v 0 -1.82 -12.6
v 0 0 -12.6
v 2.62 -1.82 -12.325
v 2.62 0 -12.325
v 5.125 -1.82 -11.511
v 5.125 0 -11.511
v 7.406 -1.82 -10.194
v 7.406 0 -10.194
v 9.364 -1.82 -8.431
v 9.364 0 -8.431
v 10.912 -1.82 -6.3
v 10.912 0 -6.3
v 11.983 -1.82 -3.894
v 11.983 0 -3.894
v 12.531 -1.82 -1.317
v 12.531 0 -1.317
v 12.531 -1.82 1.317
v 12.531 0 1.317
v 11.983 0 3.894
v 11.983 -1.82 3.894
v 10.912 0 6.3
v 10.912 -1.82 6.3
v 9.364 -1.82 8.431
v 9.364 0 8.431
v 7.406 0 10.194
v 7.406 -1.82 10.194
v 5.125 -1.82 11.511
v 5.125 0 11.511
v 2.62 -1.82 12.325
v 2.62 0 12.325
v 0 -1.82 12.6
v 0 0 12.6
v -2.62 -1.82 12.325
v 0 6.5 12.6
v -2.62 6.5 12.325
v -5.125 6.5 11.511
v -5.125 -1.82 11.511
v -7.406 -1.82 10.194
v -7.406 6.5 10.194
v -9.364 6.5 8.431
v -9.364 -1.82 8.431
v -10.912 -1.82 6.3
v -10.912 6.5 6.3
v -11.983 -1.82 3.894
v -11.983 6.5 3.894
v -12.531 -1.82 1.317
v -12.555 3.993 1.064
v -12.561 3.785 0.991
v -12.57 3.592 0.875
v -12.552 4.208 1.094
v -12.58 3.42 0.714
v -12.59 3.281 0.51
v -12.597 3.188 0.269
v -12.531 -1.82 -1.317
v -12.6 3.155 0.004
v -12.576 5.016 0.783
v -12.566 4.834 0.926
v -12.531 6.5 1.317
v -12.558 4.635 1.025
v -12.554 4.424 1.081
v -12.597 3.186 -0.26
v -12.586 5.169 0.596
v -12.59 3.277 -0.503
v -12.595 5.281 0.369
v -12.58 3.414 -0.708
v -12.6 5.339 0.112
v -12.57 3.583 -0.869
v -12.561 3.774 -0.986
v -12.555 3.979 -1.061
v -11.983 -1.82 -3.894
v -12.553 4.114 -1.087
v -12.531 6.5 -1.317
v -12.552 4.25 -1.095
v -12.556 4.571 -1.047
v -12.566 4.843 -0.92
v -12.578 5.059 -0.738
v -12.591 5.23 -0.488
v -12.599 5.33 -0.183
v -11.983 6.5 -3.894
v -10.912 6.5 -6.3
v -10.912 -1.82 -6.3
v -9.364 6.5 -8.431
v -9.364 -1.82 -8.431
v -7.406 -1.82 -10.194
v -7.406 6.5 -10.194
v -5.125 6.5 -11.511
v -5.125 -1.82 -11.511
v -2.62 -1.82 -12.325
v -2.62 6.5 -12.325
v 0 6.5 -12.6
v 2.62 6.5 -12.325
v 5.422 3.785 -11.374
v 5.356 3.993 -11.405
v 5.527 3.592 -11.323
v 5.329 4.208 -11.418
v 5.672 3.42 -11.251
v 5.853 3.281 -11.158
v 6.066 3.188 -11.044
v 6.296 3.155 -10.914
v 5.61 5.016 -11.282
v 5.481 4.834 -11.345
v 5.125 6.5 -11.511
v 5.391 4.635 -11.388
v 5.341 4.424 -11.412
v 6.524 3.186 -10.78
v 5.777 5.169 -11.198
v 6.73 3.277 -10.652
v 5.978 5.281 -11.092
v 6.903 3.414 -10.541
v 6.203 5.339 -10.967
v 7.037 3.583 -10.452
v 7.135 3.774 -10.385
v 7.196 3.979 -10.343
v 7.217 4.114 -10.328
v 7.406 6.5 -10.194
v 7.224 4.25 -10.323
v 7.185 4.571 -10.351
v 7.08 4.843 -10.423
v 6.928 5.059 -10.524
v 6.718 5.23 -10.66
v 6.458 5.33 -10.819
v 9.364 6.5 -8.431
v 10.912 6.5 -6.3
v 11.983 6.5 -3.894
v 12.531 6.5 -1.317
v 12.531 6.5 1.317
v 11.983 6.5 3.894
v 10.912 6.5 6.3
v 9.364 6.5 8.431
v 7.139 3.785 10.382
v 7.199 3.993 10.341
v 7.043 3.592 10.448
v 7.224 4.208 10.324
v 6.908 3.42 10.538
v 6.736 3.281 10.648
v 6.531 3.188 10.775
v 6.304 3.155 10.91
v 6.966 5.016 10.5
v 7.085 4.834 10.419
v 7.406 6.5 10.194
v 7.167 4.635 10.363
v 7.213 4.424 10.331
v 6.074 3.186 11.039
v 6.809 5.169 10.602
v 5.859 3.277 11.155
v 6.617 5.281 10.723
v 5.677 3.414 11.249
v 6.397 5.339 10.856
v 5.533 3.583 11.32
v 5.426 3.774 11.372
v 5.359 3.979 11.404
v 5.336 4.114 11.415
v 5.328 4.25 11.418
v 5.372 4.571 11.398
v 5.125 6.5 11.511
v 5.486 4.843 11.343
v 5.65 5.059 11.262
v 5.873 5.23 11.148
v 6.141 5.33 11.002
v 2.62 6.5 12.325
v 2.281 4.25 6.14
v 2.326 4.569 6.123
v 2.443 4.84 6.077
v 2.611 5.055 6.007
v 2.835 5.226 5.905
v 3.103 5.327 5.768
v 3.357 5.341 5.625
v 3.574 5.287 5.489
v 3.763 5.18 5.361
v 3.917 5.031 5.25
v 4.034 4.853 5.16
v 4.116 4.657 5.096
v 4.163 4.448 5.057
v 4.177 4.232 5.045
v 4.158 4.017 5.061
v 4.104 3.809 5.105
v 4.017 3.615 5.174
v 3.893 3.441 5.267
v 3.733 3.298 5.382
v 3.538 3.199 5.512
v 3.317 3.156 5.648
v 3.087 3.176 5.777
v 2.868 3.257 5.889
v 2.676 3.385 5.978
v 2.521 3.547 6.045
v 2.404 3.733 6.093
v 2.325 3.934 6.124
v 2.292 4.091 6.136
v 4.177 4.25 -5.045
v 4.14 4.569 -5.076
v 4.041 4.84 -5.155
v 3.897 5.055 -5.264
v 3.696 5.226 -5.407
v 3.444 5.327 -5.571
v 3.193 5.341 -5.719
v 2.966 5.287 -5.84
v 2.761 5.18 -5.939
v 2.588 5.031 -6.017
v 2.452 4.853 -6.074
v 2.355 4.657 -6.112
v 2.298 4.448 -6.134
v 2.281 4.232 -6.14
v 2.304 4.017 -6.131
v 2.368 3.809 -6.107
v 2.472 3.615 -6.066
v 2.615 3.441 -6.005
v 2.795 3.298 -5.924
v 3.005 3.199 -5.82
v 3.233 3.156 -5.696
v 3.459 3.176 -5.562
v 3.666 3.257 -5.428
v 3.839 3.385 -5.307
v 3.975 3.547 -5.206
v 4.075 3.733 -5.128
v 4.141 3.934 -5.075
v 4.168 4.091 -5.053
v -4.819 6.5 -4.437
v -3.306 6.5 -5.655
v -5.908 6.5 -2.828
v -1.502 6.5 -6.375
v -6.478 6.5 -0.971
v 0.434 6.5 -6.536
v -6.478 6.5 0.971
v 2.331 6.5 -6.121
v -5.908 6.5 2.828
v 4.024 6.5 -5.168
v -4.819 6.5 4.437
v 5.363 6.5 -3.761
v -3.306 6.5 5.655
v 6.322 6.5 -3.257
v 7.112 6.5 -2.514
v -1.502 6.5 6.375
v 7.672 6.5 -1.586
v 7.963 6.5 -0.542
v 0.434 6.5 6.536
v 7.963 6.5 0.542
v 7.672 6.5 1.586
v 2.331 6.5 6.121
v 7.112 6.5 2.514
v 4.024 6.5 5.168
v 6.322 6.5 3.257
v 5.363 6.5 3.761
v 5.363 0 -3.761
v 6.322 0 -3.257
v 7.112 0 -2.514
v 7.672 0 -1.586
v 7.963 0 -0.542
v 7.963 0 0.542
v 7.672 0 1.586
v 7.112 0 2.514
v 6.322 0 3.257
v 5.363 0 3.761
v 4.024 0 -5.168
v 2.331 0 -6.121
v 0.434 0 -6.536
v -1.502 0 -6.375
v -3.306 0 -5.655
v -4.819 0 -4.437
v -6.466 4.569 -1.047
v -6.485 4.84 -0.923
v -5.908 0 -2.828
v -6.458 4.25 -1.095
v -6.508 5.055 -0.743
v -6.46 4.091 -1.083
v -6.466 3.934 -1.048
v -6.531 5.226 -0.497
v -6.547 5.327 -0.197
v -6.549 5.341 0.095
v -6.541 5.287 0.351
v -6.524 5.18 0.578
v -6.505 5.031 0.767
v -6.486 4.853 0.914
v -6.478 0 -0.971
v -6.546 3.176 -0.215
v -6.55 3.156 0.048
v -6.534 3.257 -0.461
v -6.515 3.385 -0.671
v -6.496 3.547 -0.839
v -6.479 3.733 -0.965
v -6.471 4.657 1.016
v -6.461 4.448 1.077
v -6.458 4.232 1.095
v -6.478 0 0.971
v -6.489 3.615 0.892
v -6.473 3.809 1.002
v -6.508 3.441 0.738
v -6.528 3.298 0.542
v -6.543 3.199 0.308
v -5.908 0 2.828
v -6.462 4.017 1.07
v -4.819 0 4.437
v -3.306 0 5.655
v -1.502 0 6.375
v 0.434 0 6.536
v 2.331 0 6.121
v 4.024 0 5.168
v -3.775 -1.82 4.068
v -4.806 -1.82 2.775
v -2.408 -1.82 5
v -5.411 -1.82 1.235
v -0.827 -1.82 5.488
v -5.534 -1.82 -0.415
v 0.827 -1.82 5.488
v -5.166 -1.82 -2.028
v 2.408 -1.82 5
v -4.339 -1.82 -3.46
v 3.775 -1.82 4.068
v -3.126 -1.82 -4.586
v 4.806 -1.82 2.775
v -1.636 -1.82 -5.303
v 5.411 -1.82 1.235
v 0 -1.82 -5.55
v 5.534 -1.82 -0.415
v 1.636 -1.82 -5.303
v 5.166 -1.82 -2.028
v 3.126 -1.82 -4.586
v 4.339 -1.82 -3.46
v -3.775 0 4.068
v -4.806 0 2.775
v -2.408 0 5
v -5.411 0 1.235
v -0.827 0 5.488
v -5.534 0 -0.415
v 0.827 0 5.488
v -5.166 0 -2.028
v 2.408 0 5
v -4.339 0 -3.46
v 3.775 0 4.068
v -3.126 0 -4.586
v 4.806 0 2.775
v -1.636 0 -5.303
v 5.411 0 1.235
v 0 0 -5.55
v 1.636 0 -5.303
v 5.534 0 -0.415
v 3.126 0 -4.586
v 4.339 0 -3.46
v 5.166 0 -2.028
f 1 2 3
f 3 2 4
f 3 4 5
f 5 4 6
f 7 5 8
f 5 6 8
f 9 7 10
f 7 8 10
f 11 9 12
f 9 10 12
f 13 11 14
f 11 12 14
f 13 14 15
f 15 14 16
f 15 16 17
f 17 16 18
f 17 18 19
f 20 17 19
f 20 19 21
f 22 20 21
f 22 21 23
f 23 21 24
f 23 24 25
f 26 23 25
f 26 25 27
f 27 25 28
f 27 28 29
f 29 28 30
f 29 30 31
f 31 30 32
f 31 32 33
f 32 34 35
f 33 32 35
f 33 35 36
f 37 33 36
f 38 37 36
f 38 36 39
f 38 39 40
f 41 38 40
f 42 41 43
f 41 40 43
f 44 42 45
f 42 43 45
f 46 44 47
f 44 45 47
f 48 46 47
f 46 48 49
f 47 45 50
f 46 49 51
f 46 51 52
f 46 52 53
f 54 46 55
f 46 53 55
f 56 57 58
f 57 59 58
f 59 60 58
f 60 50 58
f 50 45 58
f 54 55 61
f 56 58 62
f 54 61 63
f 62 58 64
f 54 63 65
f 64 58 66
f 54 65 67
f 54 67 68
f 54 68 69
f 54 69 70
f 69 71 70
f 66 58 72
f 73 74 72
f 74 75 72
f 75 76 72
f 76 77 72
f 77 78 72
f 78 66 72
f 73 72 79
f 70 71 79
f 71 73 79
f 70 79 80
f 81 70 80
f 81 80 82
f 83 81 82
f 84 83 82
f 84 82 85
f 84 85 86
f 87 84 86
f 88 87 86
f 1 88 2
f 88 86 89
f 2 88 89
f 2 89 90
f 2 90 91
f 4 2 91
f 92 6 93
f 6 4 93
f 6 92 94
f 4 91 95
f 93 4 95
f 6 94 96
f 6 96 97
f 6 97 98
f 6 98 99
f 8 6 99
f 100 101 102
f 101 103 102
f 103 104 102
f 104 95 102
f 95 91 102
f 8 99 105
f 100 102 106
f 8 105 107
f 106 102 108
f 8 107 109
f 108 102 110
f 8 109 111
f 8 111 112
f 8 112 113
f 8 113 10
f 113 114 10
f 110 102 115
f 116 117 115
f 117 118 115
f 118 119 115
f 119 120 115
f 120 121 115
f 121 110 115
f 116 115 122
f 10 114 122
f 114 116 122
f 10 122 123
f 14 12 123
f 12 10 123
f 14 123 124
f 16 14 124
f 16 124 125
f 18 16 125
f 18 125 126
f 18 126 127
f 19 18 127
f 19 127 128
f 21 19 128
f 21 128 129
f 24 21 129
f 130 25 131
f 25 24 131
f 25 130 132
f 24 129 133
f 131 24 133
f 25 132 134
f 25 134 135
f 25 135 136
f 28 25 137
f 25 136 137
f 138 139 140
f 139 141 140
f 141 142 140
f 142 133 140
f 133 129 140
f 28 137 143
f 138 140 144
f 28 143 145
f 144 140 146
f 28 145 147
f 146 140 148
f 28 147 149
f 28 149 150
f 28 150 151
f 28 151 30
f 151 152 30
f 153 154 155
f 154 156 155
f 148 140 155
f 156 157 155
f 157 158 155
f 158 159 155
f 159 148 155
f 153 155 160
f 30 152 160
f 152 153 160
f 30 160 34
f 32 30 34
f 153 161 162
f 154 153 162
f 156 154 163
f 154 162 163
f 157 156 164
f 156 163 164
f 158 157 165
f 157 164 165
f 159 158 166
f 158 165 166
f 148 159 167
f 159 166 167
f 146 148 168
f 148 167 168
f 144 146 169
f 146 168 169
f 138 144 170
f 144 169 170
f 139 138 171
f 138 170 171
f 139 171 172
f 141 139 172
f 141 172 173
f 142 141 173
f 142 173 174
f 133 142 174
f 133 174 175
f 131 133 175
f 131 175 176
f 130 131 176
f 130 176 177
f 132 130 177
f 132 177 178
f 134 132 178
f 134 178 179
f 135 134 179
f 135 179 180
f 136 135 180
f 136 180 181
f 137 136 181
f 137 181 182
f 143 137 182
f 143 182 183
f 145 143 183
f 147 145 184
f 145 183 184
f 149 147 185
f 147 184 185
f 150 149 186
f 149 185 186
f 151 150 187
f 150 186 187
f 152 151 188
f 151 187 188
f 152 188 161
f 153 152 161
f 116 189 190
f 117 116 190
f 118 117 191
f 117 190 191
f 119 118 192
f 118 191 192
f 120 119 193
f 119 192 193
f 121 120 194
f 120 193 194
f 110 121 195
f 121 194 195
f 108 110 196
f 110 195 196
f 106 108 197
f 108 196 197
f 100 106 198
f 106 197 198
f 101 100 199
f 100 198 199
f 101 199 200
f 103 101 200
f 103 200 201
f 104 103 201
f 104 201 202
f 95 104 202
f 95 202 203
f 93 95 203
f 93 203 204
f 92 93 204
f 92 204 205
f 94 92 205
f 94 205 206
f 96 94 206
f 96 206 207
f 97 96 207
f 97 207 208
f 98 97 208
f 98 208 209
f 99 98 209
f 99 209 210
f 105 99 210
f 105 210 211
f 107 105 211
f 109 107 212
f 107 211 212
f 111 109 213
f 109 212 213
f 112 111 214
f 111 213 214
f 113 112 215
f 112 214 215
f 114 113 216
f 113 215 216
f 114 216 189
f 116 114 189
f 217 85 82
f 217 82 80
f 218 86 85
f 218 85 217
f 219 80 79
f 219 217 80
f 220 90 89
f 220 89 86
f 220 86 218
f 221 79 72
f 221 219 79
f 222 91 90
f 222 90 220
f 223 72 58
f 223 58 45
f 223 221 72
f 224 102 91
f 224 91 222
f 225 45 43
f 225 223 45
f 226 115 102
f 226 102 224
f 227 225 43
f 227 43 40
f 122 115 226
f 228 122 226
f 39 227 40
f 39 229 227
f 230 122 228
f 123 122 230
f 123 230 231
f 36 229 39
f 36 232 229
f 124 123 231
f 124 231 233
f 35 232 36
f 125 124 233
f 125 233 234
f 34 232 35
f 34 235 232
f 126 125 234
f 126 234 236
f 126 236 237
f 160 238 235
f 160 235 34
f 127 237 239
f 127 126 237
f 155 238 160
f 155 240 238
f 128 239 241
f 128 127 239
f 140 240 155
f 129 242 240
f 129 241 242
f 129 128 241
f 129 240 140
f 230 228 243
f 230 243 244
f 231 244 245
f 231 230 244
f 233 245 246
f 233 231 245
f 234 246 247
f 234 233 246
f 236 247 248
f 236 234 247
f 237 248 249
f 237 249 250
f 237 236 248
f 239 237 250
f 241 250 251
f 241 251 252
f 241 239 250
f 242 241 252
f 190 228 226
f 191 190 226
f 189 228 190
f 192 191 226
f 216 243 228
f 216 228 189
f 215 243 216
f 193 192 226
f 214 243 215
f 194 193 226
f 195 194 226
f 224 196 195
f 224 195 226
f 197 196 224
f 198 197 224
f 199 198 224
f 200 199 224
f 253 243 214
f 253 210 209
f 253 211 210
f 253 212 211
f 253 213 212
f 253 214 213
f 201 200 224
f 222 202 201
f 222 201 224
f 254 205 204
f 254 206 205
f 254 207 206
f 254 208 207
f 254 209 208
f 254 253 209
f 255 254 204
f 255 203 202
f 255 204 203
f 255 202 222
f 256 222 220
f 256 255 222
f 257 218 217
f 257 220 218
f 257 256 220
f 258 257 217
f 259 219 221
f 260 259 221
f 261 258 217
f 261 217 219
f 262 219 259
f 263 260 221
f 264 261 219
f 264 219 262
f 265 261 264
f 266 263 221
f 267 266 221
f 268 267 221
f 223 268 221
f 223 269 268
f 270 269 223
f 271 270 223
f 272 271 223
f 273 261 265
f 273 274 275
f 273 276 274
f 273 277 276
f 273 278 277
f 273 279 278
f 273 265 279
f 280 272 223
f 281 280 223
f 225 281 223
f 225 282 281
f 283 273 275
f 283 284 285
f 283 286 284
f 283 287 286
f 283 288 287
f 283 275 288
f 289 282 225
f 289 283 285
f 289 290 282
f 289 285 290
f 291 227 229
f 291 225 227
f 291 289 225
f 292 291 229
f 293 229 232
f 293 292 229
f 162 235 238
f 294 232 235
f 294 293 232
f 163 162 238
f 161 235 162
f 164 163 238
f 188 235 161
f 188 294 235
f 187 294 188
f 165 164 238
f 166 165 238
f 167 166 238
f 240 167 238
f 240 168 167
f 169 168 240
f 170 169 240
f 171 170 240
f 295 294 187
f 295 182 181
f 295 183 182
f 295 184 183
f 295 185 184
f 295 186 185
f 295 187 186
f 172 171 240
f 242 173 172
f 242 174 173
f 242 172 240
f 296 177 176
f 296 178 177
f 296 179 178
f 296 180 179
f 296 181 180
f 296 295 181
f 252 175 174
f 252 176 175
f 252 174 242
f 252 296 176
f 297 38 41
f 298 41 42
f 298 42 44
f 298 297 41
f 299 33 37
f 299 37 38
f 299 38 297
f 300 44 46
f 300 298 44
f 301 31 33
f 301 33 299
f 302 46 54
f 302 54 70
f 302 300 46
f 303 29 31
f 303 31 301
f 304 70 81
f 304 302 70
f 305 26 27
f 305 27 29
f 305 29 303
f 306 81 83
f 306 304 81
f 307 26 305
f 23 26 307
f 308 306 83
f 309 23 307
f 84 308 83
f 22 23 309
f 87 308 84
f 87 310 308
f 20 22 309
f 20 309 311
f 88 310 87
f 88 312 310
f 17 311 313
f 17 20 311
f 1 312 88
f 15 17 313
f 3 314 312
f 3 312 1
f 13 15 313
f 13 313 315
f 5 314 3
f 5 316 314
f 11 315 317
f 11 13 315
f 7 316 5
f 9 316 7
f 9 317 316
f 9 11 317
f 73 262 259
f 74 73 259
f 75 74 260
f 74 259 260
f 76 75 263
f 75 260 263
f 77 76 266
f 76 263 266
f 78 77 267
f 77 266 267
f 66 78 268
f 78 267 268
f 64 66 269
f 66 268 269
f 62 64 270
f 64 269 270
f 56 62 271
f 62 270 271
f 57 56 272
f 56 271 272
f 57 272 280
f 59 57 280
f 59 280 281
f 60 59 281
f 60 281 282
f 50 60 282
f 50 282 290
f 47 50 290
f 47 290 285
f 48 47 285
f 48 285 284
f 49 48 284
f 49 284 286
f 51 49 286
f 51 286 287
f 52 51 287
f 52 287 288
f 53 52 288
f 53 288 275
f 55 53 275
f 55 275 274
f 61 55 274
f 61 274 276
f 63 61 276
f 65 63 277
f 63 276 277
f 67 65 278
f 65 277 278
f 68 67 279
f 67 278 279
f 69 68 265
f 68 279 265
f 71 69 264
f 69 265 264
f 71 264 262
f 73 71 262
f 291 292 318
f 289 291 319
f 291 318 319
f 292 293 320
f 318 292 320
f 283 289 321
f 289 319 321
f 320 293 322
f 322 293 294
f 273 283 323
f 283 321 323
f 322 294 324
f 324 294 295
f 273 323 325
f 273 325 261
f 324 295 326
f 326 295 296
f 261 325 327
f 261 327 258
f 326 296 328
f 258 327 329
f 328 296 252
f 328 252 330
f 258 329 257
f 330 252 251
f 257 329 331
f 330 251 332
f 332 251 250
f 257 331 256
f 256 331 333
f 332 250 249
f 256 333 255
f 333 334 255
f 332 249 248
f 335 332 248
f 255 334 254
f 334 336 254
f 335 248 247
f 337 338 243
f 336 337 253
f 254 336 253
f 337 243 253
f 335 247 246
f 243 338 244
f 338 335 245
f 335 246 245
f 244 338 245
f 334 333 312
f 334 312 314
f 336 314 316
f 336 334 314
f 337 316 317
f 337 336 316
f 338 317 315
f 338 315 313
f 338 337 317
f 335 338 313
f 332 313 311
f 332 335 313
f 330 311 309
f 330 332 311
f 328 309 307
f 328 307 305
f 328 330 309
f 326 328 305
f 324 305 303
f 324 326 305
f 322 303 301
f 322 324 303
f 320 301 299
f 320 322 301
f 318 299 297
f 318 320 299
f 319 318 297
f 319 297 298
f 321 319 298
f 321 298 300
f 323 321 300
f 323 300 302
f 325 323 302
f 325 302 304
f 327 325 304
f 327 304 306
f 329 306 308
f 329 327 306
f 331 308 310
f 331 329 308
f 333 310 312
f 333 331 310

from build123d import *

# Parameters (mm, degrees)
SKETCH1_R           = 12.6
SKETCH1_R_2         = 6.55
BOSS_EXTRUDE1_DEPTH = 6.5
SKETCH2_R           = 1.095
CUT_EXTRUDE1_DEPTH  = 13.6
SKETCH4_R           = 12.6
SKETCH4_R_2         = 5.55
BOSS_EXTRUDE2_DEPTH = 1.82
CUT_EXTRUDE2_DEPTH  = 6.5
CIRPATTERN1_COUNT   = 3


with BuildPart() as part:
    # Sketch1 → Boss-Extrude1 (new body)
    with BuildSketch(Plane(origin=(0, 0, 0), x_dir=(1, 0, 0), z_dir=(0, 1, 0))):
        with Locations(Location((0, 0, 0), (0, 0, 270))):  # turned: the seam where the file's is
            Circle(SKETCH1_R)
        with Locations(Location((0, 0, 0), (0, 0, 270))):  # turned: the seam where the file's is
            Circle(SKETCH1_R_2, mode=Mode.SUBTRACT)
    extrude(amount=BOSS_EXTRUDE1_DEPTH)

    # Sketch2 → Cut-Extrude1 (cut, through all)
    with BuildSketch(Plane(origin=(0, 0, 0), x_dir=(0, 0, -1), z_dir=(1, 0, 0))):
        with Locations((0, 4.25)):
            Circle(SKETCH2_R)
    cut_extrude1 = extrude(amount=-CUT_EXTRUDE1_DEPTH, mode=Mode.SUBTRACT)

    # Sketch4 → Boss-Extrude2 (add)
    with BuildSketch(Plane.XZ):
        with Locations(Location((0, 0, 0), (0, 0, 270))):  # turned: the seam where the file's is
            Circle(SKETCH4_R)
        with Locations(Location((0, 0, 0), (0, 0, 270))):  # turned: the seam where the file's is
            Circle(SKETCH4_R_2, mode=Mode.SUBTRACT)
    extrude(amount=BOSS_EXTRUDE2_DEPTH)

    # Sketch3 → Cut-Extrude2 (cut)
    with BuildSketch(Plane(origin=(0, 6.5, 0), x_dir=(1, 0, 0), z_dir=(0, 1, 0))):
        with BuildLine():
            ThreePointArc((5.3628125, 3.760683726), (8, 0), (5.3628125, -3.760683726))
            ThreePointArc((5.3628125, -3.760683726), (6.55, 0), (5.3628125, 3.760683726))
        make_face()
    extrude(amount=-CUT_EXTRUDE2_DEPTH, mode=Mode.SUBTRACT)

    # CirPattern1: Cut-Extrude1 ×3 about axis
    cirpattern1_axis = Axis((0, 6.875, 0), (0, -1, 0))
    for i in range(1, CIRPATTERN1_COUNT):
        add(cut_extrude1.rotate(cirpattern1_axis, i * 360 / CIRPATTERN1_COUNT), mode=Mode.SUBTRACT)


solid = part.part
